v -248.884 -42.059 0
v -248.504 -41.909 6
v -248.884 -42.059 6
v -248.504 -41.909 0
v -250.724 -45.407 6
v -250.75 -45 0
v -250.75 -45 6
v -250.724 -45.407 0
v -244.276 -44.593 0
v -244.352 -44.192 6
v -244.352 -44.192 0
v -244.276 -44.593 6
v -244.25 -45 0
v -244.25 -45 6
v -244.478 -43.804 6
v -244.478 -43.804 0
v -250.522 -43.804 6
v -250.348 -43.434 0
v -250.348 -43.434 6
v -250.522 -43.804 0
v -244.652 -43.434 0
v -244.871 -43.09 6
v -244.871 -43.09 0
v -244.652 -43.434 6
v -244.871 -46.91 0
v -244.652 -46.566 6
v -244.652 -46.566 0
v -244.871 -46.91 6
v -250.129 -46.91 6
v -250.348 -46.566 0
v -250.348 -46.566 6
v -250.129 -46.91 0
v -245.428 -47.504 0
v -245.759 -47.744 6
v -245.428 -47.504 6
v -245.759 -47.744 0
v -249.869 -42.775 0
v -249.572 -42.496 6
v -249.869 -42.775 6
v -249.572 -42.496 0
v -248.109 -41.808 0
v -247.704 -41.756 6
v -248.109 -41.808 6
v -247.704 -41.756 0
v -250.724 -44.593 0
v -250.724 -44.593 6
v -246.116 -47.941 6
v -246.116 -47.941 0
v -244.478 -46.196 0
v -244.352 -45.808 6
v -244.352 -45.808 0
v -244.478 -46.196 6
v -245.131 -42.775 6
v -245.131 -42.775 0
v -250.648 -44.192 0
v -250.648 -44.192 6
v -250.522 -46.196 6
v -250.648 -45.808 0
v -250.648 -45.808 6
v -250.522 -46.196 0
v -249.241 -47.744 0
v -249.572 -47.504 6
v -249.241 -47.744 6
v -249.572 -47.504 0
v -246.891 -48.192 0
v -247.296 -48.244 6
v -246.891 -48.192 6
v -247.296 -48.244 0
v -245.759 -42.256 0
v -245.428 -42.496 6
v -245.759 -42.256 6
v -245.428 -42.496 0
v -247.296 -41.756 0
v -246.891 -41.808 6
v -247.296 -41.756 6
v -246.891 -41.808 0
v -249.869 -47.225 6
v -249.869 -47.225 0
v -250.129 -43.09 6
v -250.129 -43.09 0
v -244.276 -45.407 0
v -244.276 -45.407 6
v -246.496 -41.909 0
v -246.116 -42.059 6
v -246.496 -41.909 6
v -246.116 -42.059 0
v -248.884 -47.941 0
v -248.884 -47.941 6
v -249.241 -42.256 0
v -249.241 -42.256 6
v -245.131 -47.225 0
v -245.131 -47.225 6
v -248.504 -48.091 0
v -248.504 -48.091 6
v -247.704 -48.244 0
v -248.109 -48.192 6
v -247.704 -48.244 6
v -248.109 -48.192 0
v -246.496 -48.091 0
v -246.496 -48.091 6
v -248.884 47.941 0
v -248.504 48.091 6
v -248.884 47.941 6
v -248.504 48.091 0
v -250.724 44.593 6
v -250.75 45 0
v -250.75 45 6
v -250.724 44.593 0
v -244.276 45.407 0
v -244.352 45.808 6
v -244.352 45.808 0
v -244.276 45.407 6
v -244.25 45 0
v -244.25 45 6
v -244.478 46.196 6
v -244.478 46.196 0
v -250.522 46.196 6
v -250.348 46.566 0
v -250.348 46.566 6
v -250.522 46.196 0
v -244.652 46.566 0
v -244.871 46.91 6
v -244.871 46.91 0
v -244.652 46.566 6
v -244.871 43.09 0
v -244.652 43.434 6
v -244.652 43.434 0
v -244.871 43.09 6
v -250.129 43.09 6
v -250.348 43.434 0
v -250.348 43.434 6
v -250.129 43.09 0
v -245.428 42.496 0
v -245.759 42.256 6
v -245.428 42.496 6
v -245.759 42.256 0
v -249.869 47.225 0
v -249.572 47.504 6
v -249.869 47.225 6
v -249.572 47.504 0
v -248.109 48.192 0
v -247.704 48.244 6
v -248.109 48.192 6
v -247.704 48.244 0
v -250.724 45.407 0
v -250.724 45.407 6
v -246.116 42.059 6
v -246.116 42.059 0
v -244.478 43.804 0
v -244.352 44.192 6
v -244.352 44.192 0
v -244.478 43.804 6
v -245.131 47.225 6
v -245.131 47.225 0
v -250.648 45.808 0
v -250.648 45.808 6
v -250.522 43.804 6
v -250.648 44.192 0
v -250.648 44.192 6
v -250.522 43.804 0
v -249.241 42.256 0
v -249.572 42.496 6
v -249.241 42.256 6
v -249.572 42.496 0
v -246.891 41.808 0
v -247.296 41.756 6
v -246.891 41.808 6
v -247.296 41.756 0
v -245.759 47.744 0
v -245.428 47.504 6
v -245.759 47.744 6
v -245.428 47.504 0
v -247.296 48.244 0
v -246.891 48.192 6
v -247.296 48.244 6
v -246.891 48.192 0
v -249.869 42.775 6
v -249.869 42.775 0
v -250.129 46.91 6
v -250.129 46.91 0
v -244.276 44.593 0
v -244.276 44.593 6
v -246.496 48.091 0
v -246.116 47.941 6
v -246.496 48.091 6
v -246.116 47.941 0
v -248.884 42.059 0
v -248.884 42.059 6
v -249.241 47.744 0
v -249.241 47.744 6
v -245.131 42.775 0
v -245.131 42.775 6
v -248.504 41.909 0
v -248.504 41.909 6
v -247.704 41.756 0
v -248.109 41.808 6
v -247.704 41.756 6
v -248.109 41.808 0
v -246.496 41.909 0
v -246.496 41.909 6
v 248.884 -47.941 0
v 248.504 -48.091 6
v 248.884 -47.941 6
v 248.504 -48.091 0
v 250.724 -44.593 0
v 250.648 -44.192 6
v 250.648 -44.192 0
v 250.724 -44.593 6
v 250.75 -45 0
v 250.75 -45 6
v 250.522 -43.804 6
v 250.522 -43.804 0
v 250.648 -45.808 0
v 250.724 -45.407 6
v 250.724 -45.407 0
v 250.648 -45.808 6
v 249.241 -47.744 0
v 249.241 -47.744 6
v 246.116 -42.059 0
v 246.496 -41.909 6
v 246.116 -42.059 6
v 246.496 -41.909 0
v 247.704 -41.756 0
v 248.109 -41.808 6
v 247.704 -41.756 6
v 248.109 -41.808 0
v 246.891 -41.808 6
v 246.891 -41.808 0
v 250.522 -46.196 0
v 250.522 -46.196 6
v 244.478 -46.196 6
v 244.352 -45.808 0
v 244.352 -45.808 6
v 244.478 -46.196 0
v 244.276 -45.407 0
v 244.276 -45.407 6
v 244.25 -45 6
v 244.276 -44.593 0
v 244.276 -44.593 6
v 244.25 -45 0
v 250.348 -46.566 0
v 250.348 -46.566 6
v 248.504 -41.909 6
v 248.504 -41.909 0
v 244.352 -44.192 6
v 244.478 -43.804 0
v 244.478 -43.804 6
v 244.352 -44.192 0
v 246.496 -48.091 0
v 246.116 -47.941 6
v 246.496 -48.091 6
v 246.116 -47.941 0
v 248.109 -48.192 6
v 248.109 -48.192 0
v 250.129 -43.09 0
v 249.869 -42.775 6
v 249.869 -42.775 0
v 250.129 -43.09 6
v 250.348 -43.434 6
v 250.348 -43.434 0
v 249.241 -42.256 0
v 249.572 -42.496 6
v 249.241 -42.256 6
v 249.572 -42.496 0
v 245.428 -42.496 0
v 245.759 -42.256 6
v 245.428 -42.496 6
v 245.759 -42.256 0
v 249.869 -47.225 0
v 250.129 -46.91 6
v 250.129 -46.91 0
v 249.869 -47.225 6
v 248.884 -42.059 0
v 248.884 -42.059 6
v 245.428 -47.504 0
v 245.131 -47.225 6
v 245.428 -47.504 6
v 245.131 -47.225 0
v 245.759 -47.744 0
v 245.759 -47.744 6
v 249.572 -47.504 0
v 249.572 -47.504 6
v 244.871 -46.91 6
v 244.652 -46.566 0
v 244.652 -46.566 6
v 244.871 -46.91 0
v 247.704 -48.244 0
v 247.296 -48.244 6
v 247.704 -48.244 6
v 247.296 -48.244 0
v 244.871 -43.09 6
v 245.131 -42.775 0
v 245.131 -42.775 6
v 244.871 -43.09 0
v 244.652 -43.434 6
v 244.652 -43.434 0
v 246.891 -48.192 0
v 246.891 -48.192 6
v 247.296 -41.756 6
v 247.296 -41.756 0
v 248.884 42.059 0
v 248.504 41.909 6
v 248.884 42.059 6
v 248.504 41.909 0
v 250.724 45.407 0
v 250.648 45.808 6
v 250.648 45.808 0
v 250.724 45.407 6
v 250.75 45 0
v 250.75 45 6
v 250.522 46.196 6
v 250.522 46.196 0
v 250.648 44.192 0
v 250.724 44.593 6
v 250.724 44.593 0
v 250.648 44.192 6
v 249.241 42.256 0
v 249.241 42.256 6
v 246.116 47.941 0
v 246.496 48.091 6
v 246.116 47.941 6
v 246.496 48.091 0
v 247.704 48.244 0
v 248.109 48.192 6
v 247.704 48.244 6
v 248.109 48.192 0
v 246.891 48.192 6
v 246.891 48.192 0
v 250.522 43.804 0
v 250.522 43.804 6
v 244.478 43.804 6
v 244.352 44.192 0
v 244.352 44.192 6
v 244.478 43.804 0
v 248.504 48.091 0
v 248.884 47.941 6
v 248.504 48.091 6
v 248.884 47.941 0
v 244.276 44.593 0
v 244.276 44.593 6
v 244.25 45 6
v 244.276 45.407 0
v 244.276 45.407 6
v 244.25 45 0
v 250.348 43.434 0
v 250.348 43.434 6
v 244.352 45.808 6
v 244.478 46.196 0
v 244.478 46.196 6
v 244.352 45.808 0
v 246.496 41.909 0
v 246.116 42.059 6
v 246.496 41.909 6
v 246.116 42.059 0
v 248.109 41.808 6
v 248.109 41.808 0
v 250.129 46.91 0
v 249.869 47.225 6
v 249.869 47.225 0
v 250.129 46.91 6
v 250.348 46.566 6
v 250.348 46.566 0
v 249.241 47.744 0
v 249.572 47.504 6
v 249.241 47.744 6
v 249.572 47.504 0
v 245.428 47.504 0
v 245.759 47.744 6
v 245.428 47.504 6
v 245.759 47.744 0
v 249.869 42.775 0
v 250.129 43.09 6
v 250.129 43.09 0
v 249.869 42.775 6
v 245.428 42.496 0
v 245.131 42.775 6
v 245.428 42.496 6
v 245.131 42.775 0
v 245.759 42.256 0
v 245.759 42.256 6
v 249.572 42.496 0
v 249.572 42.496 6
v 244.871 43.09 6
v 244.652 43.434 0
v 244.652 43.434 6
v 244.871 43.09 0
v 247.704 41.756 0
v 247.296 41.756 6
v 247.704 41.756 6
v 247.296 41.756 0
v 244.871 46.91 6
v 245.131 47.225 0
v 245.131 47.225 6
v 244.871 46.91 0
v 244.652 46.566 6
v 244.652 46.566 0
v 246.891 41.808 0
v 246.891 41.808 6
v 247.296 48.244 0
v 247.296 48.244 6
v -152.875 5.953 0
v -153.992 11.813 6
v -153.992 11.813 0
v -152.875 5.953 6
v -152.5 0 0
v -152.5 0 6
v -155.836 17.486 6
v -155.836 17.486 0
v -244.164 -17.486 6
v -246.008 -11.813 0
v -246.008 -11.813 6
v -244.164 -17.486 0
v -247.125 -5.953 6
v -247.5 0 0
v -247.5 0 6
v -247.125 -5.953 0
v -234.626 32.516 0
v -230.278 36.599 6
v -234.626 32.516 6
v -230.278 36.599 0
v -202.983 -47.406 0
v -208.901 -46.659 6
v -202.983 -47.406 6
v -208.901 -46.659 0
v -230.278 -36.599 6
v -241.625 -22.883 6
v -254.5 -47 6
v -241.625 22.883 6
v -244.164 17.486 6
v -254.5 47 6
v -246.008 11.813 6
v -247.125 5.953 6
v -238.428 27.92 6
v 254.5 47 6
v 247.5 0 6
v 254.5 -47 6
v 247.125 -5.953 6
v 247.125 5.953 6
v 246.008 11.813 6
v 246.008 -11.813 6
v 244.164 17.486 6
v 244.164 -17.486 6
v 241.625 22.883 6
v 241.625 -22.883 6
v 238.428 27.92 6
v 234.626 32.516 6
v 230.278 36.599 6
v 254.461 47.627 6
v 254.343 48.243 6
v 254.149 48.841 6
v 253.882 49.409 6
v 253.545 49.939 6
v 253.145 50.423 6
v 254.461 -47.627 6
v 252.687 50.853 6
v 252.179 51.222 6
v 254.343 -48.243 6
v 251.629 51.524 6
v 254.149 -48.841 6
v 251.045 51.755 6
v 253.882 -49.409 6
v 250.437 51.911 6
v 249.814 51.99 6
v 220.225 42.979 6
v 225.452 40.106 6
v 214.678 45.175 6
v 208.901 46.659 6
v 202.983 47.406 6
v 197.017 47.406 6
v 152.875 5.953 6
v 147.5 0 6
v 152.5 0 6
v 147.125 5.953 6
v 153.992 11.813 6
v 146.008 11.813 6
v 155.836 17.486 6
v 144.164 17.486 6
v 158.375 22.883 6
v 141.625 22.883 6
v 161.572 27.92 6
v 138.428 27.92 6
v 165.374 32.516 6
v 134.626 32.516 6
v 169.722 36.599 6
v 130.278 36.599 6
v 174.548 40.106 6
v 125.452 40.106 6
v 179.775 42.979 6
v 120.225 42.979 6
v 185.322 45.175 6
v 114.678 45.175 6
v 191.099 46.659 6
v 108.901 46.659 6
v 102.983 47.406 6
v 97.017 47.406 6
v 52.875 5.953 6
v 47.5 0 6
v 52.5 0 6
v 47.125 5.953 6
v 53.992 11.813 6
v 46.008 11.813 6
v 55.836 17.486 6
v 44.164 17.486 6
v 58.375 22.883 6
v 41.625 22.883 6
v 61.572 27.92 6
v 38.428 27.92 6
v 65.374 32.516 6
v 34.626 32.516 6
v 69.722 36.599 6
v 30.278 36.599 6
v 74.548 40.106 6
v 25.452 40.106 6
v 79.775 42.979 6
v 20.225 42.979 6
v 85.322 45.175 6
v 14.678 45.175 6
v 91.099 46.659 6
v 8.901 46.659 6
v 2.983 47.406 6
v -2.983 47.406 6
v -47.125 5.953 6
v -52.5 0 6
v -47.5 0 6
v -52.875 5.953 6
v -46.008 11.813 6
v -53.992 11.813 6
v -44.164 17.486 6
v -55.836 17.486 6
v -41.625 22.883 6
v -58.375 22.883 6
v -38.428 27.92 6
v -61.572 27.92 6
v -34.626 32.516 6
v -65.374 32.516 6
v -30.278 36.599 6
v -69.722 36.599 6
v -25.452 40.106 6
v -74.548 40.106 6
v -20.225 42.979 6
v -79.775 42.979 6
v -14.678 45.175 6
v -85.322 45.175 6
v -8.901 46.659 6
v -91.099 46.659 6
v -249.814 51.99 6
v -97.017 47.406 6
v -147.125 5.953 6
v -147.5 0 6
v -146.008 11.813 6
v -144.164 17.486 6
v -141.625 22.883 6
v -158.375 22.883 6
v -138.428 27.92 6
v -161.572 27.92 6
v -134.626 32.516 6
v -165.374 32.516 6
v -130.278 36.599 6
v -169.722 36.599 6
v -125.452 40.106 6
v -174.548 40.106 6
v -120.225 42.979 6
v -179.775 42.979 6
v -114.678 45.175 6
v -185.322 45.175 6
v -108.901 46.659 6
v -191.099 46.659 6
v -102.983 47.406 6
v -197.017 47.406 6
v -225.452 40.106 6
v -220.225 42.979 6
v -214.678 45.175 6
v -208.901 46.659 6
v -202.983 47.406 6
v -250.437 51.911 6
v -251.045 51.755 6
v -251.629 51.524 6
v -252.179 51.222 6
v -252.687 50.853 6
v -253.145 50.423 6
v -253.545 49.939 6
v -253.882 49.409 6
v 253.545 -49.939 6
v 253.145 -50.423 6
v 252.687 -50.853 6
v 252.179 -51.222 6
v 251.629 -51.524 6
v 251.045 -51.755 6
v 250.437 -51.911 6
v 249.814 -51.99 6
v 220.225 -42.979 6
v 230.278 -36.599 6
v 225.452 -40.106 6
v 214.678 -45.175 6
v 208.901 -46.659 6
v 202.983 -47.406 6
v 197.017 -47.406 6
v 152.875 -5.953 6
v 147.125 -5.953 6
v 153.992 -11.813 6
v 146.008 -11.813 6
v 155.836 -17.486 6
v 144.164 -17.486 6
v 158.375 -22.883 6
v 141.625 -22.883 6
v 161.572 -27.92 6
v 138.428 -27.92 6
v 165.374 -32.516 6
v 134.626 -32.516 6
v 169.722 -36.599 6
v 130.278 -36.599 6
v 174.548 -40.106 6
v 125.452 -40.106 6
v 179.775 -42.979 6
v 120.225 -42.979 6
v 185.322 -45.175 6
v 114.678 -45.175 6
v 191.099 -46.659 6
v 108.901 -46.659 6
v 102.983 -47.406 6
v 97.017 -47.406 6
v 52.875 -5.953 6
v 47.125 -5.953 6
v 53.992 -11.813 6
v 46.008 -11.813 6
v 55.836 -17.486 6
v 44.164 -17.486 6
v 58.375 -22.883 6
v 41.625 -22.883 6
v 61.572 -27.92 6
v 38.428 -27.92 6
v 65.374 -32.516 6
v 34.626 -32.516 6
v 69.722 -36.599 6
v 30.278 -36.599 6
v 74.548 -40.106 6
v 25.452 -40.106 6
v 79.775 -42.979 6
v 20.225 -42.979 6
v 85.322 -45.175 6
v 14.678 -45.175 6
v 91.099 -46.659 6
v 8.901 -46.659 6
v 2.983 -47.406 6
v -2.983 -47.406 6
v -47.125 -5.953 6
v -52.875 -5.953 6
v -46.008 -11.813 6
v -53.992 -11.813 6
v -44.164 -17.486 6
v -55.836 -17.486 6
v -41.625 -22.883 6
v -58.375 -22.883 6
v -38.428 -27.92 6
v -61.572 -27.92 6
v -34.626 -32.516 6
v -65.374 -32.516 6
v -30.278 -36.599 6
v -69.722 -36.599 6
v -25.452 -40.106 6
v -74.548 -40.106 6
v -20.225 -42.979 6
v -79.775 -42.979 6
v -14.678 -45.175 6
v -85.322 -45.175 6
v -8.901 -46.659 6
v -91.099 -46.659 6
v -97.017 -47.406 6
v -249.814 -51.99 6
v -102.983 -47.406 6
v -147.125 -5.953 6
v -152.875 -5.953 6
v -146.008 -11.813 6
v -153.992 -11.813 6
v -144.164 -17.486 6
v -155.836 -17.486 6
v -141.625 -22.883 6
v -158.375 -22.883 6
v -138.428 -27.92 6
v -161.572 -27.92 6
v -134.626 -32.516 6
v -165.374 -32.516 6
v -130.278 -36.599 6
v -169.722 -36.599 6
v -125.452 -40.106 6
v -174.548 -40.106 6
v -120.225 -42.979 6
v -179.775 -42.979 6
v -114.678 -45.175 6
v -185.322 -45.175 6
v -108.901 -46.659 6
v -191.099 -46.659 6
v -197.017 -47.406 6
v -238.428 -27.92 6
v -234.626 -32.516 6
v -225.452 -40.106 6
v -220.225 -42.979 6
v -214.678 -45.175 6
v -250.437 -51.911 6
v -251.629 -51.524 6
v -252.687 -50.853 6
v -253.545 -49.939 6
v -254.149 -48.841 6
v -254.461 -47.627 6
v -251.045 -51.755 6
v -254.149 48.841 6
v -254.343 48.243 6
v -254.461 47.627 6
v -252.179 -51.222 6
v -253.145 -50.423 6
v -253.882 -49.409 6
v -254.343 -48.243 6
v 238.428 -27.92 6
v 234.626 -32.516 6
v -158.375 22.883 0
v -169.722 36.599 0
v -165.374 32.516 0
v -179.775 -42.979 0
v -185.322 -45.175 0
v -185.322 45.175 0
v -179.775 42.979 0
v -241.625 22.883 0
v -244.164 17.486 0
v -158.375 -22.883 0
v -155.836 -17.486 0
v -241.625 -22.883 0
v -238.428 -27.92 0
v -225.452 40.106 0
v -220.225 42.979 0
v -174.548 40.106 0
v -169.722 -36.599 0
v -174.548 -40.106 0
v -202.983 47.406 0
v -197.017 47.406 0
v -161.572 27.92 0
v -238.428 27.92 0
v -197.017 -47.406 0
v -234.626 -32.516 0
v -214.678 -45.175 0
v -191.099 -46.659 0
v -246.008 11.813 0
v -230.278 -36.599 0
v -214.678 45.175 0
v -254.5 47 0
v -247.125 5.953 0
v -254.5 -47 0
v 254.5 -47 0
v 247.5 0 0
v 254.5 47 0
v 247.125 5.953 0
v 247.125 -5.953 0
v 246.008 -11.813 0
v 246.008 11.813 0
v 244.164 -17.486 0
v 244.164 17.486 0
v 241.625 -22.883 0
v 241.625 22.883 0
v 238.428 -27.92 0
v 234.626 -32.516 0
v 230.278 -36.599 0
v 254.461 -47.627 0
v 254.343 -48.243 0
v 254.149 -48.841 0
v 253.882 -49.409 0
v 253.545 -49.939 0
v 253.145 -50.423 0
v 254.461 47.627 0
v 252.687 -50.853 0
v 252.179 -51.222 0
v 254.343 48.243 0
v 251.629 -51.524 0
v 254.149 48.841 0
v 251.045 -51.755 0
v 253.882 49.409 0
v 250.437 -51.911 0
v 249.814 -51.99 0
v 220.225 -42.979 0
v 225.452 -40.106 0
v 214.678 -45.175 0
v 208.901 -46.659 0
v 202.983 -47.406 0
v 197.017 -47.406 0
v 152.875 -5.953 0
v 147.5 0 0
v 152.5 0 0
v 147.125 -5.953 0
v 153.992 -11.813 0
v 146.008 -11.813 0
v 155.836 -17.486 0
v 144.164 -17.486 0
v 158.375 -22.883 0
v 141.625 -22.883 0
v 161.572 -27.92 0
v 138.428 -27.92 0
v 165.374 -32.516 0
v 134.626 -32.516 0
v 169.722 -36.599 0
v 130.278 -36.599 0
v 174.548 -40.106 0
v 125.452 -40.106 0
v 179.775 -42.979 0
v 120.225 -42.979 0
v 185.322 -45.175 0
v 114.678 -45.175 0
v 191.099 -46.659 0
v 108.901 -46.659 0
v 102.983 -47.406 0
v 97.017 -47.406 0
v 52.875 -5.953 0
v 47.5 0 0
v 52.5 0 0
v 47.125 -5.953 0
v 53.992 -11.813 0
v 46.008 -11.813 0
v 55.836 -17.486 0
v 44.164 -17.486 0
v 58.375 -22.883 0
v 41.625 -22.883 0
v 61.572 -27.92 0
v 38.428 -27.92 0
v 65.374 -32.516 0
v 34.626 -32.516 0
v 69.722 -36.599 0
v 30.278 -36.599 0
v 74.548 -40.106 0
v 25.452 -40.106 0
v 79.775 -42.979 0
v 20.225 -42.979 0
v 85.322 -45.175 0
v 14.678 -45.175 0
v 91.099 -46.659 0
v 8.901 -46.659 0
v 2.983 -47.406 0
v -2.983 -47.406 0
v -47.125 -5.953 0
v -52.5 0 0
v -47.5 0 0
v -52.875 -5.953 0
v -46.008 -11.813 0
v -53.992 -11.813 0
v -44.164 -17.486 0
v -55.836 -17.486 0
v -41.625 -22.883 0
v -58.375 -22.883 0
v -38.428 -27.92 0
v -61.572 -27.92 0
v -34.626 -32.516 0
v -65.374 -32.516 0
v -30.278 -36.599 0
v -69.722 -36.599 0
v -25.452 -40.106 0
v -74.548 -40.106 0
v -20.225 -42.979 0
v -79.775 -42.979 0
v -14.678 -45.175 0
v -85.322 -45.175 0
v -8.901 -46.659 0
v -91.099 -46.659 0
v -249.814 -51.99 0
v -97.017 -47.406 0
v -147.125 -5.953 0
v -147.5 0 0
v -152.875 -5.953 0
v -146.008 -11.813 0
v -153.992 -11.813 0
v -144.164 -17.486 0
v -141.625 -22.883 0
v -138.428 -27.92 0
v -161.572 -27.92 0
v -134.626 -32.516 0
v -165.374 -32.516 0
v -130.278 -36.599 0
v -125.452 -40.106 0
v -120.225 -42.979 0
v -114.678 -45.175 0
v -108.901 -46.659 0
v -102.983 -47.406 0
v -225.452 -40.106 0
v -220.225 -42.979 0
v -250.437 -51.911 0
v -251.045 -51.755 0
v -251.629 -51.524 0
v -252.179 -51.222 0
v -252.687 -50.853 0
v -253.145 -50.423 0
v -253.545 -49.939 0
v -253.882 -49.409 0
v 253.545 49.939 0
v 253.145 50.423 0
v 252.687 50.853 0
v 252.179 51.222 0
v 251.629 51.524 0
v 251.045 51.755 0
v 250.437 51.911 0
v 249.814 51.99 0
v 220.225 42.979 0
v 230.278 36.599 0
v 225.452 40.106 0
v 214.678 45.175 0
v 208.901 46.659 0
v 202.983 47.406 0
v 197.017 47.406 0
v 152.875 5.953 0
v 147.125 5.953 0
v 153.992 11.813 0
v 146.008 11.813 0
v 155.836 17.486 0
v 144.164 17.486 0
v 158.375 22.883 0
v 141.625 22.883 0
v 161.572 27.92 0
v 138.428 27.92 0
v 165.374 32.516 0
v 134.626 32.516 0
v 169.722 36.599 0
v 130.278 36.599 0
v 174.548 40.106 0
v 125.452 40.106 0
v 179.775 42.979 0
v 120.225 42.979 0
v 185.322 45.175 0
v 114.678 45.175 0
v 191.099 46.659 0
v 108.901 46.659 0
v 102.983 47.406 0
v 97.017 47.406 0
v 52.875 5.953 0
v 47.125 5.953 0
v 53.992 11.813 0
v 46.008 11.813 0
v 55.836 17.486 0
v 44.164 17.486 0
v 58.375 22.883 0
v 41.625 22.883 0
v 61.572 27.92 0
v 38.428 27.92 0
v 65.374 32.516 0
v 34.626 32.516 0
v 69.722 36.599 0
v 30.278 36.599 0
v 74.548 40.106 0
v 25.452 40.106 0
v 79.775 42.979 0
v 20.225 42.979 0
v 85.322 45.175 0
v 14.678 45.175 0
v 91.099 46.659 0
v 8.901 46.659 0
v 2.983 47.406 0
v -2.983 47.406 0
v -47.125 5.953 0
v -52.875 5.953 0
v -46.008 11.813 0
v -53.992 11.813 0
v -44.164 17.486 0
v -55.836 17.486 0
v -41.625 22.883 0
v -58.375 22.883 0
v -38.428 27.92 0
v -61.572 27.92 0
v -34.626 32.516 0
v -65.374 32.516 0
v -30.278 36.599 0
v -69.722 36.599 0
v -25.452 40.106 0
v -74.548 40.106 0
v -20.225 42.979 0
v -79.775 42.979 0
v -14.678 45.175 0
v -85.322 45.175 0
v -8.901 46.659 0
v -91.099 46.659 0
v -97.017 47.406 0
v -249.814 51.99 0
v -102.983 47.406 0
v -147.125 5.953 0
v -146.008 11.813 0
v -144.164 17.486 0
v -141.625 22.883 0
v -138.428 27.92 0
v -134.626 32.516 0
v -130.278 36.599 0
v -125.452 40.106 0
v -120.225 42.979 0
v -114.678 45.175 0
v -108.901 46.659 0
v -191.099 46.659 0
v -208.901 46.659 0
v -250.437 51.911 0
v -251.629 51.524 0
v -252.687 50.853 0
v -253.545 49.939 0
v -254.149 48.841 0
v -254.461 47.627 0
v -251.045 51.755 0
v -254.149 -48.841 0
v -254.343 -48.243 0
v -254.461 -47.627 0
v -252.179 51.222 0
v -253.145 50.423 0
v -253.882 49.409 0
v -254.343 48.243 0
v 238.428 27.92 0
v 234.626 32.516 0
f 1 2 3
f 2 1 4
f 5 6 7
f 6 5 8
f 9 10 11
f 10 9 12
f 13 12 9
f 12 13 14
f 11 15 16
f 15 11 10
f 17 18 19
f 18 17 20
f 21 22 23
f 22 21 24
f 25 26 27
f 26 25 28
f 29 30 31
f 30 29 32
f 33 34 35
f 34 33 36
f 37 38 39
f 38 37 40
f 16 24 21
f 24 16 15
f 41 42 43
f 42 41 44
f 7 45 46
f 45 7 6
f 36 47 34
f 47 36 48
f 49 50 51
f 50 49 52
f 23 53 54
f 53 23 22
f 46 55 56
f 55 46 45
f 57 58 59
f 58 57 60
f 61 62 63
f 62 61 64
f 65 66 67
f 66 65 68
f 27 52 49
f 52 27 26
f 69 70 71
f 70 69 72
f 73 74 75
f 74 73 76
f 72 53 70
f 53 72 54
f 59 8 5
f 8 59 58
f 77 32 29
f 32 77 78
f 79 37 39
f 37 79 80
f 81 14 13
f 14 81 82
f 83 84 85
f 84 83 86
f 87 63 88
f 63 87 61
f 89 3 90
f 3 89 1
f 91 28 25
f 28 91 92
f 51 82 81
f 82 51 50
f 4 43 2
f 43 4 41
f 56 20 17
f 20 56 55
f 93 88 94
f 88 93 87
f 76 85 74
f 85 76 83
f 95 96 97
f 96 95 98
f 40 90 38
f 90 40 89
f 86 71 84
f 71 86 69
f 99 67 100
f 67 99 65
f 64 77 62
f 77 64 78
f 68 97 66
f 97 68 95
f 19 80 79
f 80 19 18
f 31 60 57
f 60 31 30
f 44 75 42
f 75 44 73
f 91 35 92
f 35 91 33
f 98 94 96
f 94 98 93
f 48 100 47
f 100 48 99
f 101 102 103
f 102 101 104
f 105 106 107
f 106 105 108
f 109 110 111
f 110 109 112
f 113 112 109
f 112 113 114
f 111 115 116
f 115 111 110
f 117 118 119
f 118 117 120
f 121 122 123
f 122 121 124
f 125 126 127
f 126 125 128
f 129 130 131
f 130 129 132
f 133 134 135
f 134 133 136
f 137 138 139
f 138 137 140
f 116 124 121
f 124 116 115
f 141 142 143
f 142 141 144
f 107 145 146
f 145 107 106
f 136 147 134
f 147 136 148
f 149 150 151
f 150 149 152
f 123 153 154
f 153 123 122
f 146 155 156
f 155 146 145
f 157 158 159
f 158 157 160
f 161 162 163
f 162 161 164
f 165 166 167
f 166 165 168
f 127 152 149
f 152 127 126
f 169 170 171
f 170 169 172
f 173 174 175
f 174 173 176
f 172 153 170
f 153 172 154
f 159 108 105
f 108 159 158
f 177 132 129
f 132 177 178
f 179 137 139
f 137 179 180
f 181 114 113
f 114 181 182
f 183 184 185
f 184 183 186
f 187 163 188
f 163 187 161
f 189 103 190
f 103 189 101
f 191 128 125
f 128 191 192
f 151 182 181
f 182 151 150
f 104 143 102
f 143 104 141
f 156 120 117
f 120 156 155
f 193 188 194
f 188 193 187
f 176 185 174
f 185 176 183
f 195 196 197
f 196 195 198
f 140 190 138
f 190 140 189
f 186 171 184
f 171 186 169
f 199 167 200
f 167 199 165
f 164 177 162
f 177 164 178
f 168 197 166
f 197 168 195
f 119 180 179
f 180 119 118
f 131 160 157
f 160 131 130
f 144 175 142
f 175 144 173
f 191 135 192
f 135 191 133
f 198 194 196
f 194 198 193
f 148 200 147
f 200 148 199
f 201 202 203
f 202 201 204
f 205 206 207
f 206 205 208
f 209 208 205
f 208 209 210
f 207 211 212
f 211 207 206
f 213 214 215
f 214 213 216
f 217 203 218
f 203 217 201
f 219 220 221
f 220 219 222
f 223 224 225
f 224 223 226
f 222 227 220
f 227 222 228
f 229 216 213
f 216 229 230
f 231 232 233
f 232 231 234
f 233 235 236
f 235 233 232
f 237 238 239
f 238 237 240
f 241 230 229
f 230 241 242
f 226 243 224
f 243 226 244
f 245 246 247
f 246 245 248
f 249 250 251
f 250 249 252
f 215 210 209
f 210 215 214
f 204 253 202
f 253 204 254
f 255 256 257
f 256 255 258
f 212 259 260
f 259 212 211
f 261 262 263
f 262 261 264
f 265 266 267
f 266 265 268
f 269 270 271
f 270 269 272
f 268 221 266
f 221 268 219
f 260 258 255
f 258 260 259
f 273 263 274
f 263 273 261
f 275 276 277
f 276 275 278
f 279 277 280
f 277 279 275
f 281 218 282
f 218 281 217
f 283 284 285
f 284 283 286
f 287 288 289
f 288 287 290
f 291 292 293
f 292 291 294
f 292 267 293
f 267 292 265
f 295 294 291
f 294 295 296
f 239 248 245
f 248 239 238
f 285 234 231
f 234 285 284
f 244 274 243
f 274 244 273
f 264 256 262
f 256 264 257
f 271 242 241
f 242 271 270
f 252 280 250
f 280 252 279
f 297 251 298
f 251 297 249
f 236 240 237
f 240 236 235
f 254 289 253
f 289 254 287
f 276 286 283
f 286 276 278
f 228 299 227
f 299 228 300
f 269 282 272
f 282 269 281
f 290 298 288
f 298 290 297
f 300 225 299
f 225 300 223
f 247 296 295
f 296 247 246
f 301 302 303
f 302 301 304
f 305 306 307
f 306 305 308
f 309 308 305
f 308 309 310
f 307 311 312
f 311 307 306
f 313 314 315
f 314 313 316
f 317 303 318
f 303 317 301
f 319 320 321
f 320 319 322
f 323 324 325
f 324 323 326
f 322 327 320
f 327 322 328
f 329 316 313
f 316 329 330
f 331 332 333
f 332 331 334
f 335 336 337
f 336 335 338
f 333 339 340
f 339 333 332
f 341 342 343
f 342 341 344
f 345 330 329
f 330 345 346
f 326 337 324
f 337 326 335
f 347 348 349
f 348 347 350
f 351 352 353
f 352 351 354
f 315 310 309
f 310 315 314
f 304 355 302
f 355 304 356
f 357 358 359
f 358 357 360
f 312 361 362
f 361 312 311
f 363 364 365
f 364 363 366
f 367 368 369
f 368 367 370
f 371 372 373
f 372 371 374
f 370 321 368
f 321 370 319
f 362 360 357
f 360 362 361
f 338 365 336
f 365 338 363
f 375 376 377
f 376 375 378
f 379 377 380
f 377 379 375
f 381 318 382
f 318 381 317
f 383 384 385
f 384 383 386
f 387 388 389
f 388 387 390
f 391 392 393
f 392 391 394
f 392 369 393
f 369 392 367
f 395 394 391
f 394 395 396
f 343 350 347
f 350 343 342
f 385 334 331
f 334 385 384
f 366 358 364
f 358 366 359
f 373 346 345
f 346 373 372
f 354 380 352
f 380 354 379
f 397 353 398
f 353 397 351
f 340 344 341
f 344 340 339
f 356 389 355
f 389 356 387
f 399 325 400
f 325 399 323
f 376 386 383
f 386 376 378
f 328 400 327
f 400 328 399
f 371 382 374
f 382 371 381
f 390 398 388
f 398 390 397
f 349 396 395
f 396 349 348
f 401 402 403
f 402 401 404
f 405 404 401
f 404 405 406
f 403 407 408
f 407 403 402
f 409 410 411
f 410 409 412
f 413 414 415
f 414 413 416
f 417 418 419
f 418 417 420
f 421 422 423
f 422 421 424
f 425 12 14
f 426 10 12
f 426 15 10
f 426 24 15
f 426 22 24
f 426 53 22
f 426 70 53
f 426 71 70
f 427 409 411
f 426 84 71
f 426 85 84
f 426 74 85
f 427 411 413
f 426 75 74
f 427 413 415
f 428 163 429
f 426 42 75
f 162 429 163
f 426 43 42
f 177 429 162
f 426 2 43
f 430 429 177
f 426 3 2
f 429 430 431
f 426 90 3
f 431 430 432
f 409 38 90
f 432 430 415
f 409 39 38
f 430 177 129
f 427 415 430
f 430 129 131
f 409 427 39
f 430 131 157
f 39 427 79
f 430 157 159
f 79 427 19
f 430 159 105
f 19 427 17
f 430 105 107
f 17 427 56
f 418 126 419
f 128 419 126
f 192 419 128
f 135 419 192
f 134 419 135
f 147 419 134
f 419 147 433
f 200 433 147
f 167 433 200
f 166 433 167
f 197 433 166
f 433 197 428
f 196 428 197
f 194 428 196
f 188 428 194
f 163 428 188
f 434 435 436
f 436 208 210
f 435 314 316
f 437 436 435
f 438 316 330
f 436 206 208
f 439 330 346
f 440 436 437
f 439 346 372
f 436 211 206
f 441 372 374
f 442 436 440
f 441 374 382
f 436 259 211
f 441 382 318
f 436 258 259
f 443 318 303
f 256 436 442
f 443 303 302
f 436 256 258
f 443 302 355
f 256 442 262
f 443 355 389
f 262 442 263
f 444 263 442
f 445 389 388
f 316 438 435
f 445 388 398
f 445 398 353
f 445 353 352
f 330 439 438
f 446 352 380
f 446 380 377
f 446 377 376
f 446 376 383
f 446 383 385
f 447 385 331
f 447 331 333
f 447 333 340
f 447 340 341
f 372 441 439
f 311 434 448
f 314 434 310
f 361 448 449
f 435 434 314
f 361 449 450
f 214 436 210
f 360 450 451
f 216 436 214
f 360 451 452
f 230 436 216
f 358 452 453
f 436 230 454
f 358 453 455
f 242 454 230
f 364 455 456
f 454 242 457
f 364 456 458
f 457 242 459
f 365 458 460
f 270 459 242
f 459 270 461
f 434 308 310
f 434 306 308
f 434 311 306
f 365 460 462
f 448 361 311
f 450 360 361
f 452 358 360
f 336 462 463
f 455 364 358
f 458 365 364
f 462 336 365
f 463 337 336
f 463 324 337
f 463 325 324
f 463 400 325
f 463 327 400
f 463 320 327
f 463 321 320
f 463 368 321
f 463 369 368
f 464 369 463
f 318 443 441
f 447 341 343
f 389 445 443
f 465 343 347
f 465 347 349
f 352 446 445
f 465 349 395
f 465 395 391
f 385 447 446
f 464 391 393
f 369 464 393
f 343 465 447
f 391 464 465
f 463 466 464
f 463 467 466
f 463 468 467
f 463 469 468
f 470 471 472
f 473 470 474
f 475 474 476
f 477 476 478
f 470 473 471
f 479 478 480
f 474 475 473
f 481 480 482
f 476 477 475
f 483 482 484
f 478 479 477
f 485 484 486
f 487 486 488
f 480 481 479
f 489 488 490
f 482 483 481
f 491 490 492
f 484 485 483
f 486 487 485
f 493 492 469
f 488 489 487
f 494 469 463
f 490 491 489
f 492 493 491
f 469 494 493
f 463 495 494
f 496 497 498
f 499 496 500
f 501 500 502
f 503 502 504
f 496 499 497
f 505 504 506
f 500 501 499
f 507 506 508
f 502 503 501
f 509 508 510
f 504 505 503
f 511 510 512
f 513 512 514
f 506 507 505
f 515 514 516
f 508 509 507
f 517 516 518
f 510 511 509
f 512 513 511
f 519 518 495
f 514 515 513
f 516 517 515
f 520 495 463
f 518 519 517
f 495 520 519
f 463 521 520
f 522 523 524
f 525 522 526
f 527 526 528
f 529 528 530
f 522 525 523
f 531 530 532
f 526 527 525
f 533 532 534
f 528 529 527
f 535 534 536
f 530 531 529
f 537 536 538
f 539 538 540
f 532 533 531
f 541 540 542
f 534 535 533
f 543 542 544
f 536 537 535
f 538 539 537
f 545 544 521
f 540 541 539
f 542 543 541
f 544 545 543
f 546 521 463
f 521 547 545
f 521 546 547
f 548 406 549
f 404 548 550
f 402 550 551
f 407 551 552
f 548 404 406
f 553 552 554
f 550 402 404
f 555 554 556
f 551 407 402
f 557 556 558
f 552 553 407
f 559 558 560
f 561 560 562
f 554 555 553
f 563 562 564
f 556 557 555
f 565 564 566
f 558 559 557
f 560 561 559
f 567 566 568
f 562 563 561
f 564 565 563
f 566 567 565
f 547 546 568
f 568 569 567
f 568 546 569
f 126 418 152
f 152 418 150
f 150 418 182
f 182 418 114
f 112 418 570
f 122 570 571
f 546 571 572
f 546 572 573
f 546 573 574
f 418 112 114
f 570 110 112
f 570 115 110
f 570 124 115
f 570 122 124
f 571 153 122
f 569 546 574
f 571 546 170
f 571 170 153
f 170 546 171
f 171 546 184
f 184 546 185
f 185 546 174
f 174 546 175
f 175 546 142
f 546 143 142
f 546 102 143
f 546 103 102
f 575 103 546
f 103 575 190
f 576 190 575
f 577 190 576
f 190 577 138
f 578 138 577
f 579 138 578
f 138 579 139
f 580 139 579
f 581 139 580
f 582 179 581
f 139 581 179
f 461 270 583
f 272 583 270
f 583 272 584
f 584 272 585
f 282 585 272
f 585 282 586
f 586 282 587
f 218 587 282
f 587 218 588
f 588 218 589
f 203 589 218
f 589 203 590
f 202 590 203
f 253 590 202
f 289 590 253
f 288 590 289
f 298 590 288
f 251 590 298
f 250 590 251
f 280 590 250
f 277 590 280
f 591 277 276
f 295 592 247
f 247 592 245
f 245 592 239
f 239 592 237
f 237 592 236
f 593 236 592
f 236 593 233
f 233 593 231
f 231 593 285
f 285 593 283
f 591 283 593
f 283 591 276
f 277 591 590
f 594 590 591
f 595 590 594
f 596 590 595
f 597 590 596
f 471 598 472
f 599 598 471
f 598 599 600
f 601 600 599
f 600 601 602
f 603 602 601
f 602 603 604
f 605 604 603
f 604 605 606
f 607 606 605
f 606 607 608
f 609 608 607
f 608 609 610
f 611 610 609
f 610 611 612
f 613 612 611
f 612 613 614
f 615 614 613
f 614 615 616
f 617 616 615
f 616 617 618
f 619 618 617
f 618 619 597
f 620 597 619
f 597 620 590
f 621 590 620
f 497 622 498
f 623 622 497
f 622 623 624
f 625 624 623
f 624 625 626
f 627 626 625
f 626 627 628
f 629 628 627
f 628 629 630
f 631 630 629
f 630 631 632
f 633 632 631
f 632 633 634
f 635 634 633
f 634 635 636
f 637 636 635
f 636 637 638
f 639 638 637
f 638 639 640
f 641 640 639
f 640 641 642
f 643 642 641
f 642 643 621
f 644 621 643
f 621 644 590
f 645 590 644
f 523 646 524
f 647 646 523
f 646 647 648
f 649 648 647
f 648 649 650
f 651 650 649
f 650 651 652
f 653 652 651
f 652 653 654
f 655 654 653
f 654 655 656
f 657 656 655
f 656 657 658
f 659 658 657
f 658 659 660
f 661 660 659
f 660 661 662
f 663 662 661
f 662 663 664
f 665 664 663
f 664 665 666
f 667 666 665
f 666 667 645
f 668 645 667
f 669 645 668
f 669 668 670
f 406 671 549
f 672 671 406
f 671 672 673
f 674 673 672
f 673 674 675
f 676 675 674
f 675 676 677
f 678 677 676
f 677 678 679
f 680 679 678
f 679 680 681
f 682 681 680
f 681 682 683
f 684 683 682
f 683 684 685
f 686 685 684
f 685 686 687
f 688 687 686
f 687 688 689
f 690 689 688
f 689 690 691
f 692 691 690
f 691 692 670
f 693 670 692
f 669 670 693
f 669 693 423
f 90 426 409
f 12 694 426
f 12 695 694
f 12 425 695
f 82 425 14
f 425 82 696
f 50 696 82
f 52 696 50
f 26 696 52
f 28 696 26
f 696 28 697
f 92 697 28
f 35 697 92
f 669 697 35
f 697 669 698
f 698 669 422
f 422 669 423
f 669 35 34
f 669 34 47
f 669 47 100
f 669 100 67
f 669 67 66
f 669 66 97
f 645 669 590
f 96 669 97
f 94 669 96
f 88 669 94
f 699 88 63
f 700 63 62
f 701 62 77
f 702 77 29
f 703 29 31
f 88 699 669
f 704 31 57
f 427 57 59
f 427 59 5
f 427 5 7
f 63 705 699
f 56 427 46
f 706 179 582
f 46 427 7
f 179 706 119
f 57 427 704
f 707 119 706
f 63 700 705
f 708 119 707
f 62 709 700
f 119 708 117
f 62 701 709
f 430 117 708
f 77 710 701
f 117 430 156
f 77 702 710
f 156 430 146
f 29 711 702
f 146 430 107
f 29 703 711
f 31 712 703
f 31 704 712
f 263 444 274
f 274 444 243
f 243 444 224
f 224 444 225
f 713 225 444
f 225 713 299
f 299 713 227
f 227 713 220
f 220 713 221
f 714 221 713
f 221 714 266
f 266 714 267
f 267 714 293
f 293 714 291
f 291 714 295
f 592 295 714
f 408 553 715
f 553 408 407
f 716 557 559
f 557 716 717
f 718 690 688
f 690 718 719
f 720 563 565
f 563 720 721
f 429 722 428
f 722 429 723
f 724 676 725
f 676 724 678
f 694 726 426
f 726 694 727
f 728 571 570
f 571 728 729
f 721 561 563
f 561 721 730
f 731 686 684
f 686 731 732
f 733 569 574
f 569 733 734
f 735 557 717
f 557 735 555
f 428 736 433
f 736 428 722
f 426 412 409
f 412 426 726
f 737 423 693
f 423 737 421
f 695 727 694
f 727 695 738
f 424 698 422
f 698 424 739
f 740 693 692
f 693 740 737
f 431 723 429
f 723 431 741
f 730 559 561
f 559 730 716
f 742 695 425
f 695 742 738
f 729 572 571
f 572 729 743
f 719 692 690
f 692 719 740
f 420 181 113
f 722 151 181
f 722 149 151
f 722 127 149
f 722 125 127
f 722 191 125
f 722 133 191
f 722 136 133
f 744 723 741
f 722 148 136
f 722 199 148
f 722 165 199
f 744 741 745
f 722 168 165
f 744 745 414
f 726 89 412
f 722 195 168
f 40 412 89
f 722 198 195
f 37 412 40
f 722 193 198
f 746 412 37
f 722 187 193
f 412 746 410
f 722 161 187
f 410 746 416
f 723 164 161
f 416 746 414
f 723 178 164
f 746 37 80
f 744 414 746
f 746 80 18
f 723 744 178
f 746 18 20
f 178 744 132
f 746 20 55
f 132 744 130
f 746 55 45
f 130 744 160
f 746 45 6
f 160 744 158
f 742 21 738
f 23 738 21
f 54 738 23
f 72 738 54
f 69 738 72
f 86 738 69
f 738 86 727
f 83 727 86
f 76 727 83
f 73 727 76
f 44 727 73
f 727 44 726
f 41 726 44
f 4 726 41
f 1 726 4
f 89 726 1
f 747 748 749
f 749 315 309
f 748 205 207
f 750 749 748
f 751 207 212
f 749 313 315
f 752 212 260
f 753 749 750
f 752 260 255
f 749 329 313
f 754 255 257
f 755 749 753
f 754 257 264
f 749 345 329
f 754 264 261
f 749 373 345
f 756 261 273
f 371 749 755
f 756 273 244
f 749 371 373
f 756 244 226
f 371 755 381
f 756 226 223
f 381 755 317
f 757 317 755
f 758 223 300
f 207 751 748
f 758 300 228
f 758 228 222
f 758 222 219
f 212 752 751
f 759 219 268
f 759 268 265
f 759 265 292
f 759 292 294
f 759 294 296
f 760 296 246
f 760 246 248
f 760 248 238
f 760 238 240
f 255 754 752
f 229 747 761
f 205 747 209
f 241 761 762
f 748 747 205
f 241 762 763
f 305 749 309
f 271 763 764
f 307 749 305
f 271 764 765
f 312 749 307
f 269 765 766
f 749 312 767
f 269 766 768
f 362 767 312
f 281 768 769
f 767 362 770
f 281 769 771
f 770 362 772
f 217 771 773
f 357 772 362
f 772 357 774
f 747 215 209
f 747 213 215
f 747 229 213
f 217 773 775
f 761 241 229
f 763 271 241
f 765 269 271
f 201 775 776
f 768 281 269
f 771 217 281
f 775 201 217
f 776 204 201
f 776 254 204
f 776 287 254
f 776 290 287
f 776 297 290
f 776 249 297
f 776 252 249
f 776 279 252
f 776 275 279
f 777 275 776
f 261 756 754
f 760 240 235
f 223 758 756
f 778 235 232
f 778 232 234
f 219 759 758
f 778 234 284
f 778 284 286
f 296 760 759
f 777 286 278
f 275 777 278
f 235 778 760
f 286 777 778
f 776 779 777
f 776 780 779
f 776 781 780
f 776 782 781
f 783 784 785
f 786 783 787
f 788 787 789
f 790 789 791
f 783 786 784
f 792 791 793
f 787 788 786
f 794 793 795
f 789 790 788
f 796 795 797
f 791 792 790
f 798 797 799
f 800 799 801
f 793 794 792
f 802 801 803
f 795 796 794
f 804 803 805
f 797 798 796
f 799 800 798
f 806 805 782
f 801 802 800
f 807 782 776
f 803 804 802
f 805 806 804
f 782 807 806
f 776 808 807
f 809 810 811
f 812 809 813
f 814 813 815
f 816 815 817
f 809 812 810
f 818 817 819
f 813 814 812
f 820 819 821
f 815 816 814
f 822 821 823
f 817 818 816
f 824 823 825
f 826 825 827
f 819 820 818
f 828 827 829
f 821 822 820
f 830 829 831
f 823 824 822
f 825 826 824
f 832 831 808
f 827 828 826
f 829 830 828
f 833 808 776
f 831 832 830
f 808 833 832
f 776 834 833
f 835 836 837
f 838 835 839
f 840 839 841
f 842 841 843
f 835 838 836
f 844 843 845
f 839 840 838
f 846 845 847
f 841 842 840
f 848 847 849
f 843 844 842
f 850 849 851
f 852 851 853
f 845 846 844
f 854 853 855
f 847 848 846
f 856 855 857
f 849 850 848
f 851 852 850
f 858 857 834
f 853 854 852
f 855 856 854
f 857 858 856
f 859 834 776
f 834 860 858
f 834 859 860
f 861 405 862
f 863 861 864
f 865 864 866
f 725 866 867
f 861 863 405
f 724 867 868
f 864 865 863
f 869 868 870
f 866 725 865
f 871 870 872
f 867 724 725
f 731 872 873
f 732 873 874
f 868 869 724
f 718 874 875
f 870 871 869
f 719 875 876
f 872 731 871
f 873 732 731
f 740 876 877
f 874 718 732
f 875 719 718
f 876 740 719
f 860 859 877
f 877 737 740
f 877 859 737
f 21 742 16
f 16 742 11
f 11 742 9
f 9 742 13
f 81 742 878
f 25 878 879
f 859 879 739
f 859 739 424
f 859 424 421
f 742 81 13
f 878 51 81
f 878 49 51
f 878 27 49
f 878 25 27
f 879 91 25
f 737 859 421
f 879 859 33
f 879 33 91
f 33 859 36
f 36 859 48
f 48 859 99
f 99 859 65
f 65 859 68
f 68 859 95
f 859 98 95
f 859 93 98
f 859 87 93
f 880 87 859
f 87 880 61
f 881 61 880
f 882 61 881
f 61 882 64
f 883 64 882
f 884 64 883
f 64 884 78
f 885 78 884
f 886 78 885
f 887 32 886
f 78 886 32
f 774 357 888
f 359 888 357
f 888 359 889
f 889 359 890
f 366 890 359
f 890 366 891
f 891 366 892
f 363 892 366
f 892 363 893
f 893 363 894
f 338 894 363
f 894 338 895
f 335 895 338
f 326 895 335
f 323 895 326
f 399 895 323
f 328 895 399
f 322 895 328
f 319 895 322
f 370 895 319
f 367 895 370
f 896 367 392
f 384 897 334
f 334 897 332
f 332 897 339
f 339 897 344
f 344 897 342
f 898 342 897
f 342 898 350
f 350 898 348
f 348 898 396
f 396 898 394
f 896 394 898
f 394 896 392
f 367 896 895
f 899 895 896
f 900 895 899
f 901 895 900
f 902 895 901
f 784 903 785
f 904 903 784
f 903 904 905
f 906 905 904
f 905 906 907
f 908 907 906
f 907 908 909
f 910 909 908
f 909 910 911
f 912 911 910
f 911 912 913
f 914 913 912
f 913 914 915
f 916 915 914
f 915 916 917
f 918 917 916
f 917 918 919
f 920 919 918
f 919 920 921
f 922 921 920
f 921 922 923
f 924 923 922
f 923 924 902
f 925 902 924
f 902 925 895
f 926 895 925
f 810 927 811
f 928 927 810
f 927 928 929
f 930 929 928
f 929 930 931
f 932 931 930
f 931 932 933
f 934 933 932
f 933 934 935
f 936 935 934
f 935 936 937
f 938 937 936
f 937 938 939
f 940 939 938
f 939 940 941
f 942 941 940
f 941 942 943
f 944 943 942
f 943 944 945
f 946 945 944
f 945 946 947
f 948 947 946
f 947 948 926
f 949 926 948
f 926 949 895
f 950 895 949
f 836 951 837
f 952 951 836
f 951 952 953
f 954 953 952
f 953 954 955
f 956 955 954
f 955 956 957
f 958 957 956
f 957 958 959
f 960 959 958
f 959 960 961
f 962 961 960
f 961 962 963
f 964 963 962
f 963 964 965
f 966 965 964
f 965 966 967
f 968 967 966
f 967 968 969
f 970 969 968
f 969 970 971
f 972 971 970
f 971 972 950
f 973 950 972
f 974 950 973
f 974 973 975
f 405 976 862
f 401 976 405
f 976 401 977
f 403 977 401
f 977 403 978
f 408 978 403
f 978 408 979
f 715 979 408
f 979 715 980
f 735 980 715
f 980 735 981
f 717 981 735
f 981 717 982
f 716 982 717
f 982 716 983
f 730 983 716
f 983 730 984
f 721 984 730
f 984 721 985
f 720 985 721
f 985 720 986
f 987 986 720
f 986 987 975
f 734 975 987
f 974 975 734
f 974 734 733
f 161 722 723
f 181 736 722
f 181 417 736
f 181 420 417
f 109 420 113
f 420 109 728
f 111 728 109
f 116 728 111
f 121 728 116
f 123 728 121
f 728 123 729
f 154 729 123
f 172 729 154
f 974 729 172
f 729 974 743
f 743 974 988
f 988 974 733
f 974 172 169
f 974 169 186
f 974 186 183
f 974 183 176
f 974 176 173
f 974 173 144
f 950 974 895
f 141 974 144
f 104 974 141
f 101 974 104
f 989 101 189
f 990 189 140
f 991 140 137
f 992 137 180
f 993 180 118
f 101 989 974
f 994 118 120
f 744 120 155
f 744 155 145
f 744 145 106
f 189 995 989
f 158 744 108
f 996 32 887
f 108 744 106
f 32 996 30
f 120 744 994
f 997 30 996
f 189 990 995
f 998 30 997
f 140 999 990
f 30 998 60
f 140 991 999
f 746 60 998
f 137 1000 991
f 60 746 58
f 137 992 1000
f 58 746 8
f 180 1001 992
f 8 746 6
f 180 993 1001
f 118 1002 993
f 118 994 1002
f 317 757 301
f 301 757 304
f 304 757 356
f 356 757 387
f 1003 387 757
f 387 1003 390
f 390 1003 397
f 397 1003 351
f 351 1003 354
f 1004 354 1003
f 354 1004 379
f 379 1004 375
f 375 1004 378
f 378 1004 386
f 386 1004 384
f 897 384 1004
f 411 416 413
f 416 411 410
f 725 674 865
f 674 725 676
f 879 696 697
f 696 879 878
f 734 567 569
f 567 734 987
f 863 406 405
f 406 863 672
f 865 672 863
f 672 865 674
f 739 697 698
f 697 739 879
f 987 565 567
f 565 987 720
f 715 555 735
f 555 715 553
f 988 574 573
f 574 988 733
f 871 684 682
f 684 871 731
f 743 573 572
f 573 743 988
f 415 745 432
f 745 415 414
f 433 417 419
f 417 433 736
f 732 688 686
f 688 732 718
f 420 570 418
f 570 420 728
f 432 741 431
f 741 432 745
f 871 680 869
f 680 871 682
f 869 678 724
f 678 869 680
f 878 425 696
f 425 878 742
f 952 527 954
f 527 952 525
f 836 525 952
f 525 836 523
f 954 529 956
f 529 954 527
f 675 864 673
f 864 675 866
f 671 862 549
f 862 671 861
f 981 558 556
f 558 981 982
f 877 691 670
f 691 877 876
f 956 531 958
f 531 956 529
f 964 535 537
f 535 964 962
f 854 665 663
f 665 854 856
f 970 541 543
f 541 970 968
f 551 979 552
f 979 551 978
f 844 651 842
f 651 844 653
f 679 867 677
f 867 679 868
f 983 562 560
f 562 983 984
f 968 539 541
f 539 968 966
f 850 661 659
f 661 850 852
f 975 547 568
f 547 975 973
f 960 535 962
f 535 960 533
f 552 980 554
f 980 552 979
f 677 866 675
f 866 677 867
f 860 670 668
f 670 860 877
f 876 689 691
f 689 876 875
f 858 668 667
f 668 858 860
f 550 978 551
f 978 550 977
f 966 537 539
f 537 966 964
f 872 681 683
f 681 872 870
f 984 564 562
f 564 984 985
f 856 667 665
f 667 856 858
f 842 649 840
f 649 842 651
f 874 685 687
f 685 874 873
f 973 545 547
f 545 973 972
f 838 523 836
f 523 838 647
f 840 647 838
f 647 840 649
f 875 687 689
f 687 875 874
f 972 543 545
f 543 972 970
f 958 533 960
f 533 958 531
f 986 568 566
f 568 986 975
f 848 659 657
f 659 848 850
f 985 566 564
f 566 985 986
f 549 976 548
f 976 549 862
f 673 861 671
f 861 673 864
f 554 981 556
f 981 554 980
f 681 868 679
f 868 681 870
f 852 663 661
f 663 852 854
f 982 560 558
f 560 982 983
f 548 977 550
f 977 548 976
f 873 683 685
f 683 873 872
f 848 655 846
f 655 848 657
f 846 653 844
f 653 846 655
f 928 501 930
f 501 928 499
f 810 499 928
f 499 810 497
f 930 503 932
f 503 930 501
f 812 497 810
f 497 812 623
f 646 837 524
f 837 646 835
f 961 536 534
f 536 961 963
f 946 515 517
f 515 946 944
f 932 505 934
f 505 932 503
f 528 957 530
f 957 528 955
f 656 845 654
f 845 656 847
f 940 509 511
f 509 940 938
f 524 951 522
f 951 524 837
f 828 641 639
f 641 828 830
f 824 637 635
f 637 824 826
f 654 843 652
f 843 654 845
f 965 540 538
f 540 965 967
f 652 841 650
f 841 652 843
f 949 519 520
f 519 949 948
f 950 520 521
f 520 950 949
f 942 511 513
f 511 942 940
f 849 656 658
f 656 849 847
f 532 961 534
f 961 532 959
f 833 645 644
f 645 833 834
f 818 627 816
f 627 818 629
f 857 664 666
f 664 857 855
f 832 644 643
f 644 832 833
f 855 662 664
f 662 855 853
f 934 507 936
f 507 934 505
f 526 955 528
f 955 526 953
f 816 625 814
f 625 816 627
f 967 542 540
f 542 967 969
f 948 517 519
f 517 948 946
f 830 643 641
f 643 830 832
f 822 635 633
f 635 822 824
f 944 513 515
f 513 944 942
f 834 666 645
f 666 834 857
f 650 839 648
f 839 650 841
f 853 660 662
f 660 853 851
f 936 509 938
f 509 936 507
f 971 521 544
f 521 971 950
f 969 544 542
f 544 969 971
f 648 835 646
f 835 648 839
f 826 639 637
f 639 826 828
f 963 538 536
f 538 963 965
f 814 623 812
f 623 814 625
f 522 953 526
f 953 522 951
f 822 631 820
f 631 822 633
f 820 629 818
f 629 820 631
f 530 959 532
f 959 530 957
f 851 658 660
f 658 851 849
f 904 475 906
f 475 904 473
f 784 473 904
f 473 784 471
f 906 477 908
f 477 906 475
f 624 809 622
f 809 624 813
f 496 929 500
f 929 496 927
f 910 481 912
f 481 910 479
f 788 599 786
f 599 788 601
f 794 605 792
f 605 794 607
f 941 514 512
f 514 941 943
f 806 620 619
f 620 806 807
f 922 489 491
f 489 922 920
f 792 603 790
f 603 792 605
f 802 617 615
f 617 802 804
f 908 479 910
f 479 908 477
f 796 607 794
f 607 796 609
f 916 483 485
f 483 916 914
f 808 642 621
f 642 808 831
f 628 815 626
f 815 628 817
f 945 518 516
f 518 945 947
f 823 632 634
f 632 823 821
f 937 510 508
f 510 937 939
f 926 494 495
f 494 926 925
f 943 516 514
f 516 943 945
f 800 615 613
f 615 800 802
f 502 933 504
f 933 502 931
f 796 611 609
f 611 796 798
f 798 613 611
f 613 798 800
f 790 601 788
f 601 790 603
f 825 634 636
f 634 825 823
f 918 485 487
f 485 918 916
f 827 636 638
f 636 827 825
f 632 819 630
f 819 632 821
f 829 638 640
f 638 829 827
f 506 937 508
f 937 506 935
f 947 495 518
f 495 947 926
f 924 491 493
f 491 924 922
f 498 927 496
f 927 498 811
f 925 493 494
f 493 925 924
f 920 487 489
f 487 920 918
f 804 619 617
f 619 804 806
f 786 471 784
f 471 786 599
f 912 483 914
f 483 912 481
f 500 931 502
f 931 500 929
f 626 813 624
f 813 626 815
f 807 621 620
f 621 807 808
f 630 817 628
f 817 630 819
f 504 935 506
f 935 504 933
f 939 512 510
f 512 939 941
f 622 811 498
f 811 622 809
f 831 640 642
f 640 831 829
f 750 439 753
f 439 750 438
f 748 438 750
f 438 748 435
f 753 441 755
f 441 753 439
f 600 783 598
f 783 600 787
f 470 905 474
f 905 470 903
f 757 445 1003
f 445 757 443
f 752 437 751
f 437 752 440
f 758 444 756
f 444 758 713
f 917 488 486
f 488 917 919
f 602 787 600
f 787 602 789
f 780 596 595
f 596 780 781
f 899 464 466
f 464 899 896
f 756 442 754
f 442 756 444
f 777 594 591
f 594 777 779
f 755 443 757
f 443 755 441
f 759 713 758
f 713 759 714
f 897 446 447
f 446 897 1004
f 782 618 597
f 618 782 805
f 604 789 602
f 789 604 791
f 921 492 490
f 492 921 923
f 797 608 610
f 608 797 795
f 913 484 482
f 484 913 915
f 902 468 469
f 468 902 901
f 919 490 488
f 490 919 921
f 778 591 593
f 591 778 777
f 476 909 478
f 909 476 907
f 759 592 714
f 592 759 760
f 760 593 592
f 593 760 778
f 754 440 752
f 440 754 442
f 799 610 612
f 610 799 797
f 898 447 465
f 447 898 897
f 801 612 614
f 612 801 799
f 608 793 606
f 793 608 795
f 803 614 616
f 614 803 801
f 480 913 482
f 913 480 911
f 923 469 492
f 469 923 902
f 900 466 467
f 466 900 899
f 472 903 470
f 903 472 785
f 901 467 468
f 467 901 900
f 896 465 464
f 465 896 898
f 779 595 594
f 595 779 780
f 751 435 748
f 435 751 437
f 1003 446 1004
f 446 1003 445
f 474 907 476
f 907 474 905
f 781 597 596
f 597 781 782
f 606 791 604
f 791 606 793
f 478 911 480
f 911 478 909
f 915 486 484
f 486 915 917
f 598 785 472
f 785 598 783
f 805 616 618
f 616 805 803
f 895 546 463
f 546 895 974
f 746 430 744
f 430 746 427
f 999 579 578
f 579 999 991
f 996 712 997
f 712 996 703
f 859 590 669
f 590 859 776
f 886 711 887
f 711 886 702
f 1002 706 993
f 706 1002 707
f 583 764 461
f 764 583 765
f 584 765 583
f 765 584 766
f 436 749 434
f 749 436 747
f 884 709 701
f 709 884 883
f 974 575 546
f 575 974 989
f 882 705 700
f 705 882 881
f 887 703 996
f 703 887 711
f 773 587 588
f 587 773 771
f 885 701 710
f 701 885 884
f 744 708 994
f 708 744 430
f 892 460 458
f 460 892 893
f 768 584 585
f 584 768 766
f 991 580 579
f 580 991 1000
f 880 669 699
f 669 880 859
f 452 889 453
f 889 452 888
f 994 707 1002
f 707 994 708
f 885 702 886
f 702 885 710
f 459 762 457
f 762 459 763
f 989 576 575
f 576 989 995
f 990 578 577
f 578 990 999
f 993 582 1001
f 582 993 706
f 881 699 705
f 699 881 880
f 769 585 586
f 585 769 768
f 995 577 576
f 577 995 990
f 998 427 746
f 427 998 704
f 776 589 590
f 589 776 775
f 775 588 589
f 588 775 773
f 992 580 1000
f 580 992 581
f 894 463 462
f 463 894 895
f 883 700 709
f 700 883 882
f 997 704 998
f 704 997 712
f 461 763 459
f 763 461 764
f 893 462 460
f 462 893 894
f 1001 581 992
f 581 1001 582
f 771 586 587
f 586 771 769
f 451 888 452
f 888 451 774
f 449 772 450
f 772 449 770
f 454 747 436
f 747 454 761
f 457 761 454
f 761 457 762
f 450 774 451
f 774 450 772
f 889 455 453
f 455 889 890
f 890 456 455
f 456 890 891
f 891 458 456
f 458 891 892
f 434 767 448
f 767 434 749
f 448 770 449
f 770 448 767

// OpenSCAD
$fn = 50;


difference() {
	union() {
		hull() {
			translate(v = [-249.5000000000, 47.0000000000, 0]) {
				cylinder(h = 6, r = 5);
			}
			translate(v = [249.5000000000, 47.0000000000, 0]) {
				cylinder(h = 6, r = 5);
			}
			translate(v = [-249.5000000000, -47.0000000000, 0]) {
				cylinder(h = 6, r = 5);
			}
			translate(v = [249.5000000000, -47.0000000000, 0]) {
				cylinder(h = 6, r = 5);
			}
		}
	}
	union() {
		#translate(v = [-247.5000000000, -45.0000000000, -100.0000000000]) {
			cylinder(h = 200, r = 3.2500000000);
		}
		#translate(v = [-247.5000000000, 45.0000000000, -100.0000000000]) {
			cylinder(h = 200, r = 3.2500000000);
		}
		#translate(v = [247.5000000000, -45.0000000000, -100.0000000000]) {
			cylinder(h = 200, r = 3.2500000000);
		}
		#translate(v = [247.5000000000, 45.0000000000, -100.0000000000]) {
			cylinder(h = 200, r = 3.2500000000);
		}
		#translate(v = [-200.0000000000, 0, 0]) {
			cylinder(h = 6, r = 47.5000000000);
		}
		#translate(v = [-100.0000000000, 0, 0]) {
			cylinder(h = 6, r = 47.5000000000);
		}
		#cylinder(h = 6, r = 47.5000000000);
		#translate(v = [100.0000000000, 0, 0]) {
			cylinder(h = 6, r = 47.5000000000);
		}
		#translate(v = [200.0000000000, 0, 0]) {
			cylinder(h = 6, r = 47.5000000000);
		}
	}
}
